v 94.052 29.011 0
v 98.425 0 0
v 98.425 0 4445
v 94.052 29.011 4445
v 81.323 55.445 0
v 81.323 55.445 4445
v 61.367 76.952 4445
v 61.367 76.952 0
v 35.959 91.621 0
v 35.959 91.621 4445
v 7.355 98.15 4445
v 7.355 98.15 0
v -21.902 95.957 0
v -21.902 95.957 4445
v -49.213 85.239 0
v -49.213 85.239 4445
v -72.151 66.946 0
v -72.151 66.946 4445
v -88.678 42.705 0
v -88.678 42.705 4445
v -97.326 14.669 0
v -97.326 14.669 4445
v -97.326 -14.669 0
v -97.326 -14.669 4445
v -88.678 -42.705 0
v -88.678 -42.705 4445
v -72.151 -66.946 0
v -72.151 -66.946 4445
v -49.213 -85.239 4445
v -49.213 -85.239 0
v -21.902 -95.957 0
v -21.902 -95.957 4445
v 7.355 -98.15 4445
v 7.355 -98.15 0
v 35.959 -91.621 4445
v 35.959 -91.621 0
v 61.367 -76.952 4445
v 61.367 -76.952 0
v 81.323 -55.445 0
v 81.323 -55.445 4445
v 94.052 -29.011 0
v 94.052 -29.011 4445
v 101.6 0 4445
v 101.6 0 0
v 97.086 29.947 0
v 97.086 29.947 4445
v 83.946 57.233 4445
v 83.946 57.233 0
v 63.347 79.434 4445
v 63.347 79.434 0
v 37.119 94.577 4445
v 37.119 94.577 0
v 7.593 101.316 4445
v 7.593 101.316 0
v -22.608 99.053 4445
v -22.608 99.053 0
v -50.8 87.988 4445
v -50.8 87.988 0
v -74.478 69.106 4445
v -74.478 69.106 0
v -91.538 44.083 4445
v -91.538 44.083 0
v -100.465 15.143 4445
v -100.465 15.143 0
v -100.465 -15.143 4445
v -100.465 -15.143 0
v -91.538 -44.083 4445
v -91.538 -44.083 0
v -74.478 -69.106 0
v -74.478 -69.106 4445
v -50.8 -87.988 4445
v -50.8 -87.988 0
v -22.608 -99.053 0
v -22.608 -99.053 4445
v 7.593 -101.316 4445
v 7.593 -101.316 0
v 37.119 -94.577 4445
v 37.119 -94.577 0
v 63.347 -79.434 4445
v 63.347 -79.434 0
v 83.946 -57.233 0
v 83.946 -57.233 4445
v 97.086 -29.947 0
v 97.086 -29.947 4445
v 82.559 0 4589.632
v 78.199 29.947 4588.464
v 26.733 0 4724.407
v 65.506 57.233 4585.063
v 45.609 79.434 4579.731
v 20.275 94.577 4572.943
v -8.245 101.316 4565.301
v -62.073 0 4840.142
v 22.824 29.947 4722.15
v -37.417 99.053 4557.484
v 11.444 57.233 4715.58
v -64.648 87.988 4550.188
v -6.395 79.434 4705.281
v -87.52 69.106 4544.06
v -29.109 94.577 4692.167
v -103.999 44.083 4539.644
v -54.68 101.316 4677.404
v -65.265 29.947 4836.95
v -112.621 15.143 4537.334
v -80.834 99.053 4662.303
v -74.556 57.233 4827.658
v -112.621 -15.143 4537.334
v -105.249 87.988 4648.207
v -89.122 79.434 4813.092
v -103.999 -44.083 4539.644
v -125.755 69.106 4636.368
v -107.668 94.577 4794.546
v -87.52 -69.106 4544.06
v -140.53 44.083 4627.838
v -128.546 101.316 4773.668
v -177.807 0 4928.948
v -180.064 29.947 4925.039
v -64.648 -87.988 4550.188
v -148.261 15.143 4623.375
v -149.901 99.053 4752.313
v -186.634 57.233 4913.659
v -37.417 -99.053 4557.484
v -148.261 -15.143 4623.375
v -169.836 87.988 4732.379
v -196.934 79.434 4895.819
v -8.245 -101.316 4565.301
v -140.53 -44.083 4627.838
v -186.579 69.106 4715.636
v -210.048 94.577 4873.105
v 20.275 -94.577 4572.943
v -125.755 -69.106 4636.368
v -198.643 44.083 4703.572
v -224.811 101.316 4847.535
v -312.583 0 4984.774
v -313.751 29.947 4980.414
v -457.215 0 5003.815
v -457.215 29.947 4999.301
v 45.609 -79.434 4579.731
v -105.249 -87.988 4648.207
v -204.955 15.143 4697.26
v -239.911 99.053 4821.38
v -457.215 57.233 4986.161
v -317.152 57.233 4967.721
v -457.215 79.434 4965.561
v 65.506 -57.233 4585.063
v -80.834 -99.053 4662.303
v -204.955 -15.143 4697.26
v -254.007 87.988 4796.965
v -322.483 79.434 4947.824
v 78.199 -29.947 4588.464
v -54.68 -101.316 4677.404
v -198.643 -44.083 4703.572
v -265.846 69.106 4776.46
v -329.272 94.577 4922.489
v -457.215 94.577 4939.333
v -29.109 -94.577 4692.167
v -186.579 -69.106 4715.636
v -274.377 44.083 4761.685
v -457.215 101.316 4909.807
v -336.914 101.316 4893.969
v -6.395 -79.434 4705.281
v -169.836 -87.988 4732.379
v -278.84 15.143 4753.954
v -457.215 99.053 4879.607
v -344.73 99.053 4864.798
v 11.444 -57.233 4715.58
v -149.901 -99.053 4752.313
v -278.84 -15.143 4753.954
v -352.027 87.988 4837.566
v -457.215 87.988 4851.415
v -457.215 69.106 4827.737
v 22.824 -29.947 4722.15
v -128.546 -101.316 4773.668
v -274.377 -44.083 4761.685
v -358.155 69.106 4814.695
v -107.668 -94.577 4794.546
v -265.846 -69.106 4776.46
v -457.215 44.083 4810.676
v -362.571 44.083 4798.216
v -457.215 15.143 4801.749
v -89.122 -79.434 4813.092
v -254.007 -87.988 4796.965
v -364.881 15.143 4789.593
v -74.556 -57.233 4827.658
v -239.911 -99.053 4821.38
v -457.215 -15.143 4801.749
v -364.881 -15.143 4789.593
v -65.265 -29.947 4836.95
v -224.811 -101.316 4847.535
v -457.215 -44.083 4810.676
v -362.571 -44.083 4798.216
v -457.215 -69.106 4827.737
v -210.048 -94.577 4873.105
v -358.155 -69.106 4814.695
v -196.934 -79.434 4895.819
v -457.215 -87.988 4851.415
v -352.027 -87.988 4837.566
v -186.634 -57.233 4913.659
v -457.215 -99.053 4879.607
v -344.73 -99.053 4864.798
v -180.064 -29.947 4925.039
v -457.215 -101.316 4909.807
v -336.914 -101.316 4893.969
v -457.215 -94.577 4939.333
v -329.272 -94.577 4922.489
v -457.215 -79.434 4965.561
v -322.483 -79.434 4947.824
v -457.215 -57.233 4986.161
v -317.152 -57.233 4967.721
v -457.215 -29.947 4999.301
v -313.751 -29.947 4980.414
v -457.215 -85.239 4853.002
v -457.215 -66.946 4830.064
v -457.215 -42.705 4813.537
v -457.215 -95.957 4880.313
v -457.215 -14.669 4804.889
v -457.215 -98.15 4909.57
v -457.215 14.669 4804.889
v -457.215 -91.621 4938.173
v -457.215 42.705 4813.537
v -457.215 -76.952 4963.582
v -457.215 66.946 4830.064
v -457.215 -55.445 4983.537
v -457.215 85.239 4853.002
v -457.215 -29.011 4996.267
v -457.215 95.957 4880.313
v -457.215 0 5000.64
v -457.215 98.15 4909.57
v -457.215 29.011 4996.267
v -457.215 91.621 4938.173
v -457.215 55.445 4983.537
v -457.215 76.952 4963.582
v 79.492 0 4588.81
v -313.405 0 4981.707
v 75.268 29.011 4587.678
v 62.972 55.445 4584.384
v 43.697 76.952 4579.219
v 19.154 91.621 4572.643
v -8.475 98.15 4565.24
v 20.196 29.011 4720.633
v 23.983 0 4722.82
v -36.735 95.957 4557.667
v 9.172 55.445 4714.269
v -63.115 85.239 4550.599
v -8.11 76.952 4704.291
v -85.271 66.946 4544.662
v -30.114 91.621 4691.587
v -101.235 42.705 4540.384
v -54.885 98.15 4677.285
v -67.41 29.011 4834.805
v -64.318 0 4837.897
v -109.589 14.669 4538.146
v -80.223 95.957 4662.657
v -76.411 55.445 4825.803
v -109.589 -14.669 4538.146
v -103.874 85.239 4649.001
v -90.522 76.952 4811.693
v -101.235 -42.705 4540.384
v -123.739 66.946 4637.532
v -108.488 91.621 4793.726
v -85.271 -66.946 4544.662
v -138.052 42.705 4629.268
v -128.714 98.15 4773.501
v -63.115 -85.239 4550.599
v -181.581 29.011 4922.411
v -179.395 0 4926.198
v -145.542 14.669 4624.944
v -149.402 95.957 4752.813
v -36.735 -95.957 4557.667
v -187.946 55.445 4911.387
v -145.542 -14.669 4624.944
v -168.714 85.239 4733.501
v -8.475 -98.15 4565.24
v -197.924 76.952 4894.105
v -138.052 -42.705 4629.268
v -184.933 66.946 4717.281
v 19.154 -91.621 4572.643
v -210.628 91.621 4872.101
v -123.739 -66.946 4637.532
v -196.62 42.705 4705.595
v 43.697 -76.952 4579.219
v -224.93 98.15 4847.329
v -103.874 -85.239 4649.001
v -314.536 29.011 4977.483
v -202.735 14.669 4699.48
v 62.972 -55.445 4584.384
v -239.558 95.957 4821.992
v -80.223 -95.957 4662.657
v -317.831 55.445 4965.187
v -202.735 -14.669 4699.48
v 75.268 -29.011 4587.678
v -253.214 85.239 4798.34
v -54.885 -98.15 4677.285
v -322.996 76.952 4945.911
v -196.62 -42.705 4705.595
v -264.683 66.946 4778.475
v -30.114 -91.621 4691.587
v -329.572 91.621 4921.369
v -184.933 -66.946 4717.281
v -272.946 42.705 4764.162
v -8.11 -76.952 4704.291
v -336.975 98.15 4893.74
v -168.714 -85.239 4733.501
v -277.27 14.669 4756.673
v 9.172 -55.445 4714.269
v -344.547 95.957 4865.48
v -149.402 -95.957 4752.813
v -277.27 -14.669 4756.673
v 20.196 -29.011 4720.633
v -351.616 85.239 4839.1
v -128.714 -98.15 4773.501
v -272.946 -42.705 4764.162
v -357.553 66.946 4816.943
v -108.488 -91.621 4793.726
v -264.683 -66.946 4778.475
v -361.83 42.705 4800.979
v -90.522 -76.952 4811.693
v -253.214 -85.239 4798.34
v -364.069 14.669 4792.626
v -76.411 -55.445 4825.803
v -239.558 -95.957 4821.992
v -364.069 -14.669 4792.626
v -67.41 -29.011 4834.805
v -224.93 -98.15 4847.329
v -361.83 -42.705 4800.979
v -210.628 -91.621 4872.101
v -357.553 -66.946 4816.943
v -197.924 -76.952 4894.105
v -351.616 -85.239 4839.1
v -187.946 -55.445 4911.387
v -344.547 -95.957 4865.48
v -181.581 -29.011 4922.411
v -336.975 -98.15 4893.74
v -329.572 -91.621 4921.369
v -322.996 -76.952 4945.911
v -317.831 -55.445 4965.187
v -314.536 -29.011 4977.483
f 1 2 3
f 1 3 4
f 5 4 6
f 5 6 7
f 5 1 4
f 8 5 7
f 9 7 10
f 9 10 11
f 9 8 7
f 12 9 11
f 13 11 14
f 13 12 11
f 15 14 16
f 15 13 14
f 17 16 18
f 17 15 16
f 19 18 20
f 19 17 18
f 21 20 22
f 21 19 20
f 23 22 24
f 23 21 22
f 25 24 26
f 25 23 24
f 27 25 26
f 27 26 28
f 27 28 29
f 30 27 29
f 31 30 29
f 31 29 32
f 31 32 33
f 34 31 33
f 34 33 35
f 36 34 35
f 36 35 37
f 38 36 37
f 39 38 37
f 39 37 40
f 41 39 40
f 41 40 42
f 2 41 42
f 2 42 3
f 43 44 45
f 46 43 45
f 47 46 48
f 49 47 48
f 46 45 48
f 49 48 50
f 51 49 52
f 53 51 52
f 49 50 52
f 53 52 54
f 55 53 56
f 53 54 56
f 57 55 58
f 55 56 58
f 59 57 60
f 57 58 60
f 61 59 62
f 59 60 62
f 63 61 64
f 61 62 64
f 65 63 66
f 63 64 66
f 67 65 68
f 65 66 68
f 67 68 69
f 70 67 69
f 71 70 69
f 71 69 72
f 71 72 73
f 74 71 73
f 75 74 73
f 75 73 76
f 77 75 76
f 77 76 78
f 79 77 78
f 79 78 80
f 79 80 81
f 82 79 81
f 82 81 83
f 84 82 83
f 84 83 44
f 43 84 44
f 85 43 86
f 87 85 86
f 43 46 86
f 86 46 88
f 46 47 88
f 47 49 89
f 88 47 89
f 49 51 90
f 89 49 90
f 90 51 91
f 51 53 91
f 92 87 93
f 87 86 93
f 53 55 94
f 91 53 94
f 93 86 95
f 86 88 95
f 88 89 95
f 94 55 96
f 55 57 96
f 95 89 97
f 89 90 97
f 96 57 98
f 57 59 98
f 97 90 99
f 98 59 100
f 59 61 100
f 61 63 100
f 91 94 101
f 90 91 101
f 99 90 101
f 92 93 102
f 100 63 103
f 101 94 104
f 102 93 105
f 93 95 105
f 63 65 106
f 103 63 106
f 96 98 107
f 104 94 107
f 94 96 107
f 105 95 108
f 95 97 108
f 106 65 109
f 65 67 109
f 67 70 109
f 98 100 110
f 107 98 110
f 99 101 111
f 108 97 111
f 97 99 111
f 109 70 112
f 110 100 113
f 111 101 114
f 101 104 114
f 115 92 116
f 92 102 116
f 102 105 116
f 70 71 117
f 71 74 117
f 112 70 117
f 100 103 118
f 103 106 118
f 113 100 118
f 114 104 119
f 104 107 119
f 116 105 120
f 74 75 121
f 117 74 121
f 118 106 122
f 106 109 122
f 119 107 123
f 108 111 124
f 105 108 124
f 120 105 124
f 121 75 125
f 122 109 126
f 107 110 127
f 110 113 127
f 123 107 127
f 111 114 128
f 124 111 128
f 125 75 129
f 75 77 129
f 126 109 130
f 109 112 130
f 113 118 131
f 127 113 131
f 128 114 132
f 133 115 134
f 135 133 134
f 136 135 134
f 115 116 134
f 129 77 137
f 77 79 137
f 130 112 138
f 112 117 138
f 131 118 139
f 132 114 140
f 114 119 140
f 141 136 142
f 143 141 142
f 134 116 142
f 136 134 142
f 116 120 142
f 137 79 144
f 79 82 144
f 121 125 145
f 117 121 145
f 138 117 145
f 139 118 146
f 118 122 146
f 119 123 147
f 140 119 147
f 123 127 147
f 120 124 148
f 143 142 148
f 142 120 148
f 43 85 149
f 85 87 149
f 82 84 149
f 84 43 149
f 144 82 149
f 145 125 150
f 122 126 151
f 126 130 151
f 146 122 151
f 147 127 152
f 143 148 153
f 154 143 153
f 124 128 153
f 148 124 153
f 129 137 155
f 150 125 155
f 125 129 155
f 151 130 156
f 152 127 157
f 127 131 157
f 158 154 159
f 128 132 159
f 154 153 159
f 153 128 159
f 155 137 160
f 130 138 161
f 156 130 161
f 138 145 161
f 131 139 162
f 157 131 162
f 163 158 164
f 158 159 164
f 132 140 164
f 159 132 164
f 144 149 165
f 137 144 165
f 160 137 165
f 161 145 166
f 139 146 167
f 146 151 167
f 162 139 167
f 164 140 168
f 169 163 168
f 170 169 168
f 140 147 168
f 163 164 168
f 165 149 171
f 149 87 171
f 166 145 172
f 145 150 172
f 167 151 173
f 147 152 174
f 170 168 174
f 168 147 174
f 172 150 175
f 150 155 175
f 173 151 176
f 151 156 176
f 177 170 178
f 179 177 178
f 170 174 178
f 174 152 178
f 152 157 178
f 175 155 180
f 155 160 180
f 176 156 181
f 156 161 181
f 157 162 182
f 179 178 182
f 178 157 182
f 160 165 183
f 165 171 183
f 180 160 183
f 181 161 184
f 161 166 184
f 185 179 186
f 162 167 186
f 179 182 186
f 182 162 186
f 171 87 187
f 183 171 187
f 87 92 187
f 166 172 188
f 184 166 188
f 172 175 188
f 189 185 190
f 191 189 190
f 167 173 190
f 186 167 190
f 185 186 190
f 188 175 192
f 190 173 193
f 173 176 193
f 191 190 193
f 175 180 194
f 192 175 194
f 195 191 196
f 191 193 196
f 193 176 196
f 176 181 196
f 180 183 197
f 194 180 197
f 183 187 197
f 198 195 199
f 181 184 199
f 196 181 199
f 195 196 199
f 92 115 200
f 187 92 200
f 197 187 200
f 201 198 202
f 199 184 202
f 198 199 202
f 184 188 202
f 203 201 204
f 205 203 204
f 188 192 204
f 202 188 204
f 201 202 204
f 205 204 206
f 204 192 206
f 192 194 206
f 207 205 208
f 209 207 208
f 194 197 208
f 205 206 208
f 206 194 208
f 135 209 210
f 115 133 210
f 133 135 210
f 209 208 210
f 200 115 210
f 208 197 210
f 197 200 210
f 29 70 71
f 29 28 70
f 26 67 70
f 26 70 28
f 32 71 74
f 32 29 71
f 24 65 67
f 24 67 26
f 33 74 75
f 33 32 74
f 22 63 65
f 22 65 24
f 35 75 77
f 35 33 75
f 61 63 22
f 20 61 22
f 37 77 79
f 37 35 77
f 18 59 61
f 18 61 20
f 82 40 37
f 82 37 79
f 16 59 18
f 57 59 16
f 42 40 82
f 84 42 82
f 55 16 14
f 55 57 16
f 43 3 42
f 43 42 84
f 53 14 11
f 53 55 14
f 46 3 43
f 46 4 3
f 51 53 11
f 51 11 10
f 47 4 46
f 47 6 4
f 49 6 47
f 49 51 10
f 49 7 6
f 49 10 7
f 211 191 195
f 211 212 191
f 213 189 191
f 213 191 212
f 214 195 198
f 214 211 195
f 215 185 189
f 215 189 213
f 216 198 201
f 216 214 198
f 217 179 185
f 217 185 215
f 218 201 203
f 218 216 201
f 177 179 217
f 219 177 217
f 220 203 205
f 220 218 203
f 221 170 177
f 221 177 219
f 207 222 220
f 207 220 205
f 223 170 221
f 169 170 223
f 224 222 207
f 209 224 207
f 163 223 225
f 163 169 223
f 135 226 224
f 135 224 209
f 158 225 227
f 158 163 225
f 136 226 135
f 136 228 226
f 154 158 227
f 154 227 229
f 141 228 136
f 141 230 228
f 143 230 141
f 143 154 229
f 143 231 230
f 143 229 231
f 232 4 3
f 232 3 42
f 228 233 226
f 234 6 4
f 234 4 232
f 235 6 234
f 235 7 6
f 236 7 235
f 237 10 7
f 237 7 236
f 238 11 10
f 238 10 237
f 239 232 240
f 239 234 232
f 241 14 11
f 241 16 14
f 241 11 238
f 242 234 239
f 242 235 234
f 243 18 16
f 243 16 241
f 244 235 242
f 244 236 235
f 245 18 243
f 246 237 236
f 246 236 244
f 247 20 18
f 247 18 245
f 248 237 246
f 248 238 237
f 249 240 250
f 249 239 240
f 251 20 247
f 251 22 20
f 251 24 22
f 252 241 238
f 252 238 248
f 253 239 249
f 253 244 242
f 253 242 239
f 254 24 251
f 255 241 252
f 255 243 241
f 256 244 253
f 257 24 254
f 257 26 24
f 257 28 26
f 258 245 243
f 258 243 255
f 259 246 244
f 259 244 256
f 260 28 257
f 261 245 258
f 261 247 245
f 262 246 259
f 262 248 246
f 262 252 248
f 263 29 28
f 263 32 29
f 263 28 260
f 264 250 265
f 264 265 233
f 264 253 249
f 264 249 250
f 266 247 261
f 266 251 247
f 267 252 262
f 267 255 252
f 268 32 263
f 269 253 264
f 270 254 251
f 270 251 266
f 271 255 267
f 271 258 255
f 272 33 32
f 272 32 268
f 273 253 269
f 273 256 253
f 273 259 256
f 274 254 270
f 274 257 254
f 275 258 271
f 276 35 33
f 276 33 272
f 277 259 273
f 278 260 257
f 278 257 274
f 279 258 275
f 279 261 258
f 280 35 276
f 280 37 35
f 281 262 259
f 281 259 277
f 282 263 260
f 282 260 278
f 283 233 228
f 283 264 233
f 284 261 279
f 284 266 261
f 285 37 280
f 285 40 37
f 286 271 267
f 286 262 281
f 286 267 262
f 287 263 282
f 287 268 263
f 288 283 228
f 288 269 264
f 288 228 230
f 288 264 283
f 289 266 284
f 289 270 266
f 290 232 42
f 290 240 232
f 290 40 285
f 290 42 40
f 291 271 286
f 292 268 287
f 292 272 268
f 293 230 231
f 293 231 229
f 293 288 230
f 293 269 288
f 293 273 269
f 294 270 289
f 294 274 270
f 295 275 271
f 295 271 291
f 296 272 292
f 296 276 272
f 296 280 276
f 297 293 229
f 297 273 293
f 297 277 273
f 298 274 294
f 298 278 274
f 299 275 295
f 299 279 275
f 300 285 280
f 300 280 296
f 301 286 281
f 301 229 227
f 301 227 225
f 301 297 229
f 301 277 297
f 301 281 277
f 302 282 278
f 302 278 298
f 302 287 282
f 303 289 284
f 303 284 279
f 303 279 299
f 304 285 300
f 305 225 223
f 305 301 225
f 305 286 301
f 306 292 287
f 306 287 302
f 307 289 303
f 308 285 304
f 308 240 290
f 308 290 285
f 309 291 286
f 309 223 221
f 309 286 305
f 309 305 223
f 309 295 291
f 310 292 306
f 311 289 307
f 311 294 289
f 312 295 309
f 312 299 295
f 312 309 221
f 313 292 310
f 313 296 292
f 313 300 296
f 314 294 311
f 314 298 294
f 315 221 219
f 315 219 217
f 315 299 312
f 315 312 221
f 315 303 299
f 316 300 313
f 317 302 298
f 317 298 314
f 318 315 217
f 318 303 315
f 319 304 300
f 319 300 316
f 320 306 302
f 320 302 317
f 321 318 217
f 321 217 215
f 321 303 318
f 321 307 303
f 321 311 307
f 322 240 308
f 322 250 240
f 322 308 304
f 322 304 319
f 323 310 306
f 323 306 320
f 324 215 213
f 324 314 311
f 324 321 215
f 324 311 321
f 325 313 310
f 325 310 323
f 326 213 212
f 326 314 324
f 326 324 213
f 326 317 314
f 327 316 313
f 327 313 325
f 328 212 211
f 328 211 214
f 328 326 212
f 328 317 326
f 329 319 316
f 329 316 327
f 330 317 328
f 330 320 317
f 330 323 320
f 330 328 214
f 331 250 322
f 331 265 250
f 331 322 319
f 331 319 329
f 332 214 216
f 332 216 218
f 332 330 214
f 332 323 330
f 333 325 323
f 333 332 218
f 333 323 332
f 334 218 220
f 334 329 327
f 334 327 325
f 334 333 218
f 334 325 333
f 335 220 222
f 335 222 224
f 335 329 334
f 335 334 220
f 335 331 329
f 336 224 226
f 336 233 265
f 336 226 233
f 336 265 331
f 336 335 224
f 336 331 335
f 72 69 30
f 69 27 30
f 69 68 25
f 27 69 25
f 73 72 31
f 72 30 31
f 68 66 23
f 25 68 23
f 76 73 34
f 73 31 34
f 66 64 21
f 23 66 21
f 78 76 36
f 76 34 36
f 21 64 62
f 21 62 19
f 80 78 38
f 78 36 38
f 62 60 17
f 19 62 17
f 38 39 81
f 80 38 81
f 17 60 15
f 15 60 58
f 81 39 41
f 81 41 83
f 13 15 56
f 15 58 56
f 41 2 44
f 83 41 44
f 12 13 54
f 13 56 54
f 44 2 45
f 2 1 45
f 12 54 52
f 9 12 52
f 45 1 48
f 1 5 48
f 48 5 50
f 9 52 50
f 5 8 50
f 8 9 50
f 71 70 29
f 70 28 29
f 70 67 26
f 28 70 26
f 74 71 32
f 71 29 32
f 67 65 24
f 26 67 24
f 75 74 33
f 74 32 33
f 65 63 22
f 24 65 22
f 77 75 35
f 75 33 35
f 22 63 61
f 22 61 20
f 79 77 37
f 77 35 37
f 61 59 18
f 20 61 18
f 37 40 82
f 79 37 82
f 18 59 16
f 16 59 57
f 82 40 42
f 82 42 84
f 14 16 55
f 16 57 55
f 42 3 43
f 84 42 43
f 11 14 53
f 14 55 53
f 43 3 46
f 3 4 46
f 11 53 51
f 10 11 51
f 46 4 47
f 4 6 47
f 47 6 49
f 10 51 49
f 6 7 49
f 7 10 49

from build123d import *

# Parameters (mm, degrees)
F6_R     = 101.6
F6_R_2   = 98.425
F7_ANGLE = 90
F5_R     = 101.6
F5_R_2   = 98.425
F8_DEPTH = 1206.5
F1_R     = 101.6
F1_R_2   = 98.425
F9_DEPTH = 3238.5


with BuildPart() as f7:
    # F6 (on line) → F7 (revolve)
    with BuildSketch(Plane.XY.offset(4445)):
        Circle(F6_R)
        Circle(F6_R_2, mode=Mode.SUBTRACT)
    revolve(axis=Axis((-457.214653492, -101.6, 4445), (0, -1, 0)), revolution_arc=F7_ANGLE)


with BuildPart() as f8:
    # F5 (on line) → F8 (new body)
    with BuildSketch(Plane.XY.offset(3238.5)):
        Circle(F5_R)
        Circle(F5_R_2, mode=Mode.SUBTRACT)
    extrude(amount=F8_DEPTH)

    # F1 (on Top) → F9 (join)
    with BuildSketch(Plane.XY):
        Circle(F1_R)
        Circle(F1_R_2, mode=Mode.SUBTRACT)
    extrude(amount=F9_DEPTH)


solid = Compound([f7.part, f8.part])
